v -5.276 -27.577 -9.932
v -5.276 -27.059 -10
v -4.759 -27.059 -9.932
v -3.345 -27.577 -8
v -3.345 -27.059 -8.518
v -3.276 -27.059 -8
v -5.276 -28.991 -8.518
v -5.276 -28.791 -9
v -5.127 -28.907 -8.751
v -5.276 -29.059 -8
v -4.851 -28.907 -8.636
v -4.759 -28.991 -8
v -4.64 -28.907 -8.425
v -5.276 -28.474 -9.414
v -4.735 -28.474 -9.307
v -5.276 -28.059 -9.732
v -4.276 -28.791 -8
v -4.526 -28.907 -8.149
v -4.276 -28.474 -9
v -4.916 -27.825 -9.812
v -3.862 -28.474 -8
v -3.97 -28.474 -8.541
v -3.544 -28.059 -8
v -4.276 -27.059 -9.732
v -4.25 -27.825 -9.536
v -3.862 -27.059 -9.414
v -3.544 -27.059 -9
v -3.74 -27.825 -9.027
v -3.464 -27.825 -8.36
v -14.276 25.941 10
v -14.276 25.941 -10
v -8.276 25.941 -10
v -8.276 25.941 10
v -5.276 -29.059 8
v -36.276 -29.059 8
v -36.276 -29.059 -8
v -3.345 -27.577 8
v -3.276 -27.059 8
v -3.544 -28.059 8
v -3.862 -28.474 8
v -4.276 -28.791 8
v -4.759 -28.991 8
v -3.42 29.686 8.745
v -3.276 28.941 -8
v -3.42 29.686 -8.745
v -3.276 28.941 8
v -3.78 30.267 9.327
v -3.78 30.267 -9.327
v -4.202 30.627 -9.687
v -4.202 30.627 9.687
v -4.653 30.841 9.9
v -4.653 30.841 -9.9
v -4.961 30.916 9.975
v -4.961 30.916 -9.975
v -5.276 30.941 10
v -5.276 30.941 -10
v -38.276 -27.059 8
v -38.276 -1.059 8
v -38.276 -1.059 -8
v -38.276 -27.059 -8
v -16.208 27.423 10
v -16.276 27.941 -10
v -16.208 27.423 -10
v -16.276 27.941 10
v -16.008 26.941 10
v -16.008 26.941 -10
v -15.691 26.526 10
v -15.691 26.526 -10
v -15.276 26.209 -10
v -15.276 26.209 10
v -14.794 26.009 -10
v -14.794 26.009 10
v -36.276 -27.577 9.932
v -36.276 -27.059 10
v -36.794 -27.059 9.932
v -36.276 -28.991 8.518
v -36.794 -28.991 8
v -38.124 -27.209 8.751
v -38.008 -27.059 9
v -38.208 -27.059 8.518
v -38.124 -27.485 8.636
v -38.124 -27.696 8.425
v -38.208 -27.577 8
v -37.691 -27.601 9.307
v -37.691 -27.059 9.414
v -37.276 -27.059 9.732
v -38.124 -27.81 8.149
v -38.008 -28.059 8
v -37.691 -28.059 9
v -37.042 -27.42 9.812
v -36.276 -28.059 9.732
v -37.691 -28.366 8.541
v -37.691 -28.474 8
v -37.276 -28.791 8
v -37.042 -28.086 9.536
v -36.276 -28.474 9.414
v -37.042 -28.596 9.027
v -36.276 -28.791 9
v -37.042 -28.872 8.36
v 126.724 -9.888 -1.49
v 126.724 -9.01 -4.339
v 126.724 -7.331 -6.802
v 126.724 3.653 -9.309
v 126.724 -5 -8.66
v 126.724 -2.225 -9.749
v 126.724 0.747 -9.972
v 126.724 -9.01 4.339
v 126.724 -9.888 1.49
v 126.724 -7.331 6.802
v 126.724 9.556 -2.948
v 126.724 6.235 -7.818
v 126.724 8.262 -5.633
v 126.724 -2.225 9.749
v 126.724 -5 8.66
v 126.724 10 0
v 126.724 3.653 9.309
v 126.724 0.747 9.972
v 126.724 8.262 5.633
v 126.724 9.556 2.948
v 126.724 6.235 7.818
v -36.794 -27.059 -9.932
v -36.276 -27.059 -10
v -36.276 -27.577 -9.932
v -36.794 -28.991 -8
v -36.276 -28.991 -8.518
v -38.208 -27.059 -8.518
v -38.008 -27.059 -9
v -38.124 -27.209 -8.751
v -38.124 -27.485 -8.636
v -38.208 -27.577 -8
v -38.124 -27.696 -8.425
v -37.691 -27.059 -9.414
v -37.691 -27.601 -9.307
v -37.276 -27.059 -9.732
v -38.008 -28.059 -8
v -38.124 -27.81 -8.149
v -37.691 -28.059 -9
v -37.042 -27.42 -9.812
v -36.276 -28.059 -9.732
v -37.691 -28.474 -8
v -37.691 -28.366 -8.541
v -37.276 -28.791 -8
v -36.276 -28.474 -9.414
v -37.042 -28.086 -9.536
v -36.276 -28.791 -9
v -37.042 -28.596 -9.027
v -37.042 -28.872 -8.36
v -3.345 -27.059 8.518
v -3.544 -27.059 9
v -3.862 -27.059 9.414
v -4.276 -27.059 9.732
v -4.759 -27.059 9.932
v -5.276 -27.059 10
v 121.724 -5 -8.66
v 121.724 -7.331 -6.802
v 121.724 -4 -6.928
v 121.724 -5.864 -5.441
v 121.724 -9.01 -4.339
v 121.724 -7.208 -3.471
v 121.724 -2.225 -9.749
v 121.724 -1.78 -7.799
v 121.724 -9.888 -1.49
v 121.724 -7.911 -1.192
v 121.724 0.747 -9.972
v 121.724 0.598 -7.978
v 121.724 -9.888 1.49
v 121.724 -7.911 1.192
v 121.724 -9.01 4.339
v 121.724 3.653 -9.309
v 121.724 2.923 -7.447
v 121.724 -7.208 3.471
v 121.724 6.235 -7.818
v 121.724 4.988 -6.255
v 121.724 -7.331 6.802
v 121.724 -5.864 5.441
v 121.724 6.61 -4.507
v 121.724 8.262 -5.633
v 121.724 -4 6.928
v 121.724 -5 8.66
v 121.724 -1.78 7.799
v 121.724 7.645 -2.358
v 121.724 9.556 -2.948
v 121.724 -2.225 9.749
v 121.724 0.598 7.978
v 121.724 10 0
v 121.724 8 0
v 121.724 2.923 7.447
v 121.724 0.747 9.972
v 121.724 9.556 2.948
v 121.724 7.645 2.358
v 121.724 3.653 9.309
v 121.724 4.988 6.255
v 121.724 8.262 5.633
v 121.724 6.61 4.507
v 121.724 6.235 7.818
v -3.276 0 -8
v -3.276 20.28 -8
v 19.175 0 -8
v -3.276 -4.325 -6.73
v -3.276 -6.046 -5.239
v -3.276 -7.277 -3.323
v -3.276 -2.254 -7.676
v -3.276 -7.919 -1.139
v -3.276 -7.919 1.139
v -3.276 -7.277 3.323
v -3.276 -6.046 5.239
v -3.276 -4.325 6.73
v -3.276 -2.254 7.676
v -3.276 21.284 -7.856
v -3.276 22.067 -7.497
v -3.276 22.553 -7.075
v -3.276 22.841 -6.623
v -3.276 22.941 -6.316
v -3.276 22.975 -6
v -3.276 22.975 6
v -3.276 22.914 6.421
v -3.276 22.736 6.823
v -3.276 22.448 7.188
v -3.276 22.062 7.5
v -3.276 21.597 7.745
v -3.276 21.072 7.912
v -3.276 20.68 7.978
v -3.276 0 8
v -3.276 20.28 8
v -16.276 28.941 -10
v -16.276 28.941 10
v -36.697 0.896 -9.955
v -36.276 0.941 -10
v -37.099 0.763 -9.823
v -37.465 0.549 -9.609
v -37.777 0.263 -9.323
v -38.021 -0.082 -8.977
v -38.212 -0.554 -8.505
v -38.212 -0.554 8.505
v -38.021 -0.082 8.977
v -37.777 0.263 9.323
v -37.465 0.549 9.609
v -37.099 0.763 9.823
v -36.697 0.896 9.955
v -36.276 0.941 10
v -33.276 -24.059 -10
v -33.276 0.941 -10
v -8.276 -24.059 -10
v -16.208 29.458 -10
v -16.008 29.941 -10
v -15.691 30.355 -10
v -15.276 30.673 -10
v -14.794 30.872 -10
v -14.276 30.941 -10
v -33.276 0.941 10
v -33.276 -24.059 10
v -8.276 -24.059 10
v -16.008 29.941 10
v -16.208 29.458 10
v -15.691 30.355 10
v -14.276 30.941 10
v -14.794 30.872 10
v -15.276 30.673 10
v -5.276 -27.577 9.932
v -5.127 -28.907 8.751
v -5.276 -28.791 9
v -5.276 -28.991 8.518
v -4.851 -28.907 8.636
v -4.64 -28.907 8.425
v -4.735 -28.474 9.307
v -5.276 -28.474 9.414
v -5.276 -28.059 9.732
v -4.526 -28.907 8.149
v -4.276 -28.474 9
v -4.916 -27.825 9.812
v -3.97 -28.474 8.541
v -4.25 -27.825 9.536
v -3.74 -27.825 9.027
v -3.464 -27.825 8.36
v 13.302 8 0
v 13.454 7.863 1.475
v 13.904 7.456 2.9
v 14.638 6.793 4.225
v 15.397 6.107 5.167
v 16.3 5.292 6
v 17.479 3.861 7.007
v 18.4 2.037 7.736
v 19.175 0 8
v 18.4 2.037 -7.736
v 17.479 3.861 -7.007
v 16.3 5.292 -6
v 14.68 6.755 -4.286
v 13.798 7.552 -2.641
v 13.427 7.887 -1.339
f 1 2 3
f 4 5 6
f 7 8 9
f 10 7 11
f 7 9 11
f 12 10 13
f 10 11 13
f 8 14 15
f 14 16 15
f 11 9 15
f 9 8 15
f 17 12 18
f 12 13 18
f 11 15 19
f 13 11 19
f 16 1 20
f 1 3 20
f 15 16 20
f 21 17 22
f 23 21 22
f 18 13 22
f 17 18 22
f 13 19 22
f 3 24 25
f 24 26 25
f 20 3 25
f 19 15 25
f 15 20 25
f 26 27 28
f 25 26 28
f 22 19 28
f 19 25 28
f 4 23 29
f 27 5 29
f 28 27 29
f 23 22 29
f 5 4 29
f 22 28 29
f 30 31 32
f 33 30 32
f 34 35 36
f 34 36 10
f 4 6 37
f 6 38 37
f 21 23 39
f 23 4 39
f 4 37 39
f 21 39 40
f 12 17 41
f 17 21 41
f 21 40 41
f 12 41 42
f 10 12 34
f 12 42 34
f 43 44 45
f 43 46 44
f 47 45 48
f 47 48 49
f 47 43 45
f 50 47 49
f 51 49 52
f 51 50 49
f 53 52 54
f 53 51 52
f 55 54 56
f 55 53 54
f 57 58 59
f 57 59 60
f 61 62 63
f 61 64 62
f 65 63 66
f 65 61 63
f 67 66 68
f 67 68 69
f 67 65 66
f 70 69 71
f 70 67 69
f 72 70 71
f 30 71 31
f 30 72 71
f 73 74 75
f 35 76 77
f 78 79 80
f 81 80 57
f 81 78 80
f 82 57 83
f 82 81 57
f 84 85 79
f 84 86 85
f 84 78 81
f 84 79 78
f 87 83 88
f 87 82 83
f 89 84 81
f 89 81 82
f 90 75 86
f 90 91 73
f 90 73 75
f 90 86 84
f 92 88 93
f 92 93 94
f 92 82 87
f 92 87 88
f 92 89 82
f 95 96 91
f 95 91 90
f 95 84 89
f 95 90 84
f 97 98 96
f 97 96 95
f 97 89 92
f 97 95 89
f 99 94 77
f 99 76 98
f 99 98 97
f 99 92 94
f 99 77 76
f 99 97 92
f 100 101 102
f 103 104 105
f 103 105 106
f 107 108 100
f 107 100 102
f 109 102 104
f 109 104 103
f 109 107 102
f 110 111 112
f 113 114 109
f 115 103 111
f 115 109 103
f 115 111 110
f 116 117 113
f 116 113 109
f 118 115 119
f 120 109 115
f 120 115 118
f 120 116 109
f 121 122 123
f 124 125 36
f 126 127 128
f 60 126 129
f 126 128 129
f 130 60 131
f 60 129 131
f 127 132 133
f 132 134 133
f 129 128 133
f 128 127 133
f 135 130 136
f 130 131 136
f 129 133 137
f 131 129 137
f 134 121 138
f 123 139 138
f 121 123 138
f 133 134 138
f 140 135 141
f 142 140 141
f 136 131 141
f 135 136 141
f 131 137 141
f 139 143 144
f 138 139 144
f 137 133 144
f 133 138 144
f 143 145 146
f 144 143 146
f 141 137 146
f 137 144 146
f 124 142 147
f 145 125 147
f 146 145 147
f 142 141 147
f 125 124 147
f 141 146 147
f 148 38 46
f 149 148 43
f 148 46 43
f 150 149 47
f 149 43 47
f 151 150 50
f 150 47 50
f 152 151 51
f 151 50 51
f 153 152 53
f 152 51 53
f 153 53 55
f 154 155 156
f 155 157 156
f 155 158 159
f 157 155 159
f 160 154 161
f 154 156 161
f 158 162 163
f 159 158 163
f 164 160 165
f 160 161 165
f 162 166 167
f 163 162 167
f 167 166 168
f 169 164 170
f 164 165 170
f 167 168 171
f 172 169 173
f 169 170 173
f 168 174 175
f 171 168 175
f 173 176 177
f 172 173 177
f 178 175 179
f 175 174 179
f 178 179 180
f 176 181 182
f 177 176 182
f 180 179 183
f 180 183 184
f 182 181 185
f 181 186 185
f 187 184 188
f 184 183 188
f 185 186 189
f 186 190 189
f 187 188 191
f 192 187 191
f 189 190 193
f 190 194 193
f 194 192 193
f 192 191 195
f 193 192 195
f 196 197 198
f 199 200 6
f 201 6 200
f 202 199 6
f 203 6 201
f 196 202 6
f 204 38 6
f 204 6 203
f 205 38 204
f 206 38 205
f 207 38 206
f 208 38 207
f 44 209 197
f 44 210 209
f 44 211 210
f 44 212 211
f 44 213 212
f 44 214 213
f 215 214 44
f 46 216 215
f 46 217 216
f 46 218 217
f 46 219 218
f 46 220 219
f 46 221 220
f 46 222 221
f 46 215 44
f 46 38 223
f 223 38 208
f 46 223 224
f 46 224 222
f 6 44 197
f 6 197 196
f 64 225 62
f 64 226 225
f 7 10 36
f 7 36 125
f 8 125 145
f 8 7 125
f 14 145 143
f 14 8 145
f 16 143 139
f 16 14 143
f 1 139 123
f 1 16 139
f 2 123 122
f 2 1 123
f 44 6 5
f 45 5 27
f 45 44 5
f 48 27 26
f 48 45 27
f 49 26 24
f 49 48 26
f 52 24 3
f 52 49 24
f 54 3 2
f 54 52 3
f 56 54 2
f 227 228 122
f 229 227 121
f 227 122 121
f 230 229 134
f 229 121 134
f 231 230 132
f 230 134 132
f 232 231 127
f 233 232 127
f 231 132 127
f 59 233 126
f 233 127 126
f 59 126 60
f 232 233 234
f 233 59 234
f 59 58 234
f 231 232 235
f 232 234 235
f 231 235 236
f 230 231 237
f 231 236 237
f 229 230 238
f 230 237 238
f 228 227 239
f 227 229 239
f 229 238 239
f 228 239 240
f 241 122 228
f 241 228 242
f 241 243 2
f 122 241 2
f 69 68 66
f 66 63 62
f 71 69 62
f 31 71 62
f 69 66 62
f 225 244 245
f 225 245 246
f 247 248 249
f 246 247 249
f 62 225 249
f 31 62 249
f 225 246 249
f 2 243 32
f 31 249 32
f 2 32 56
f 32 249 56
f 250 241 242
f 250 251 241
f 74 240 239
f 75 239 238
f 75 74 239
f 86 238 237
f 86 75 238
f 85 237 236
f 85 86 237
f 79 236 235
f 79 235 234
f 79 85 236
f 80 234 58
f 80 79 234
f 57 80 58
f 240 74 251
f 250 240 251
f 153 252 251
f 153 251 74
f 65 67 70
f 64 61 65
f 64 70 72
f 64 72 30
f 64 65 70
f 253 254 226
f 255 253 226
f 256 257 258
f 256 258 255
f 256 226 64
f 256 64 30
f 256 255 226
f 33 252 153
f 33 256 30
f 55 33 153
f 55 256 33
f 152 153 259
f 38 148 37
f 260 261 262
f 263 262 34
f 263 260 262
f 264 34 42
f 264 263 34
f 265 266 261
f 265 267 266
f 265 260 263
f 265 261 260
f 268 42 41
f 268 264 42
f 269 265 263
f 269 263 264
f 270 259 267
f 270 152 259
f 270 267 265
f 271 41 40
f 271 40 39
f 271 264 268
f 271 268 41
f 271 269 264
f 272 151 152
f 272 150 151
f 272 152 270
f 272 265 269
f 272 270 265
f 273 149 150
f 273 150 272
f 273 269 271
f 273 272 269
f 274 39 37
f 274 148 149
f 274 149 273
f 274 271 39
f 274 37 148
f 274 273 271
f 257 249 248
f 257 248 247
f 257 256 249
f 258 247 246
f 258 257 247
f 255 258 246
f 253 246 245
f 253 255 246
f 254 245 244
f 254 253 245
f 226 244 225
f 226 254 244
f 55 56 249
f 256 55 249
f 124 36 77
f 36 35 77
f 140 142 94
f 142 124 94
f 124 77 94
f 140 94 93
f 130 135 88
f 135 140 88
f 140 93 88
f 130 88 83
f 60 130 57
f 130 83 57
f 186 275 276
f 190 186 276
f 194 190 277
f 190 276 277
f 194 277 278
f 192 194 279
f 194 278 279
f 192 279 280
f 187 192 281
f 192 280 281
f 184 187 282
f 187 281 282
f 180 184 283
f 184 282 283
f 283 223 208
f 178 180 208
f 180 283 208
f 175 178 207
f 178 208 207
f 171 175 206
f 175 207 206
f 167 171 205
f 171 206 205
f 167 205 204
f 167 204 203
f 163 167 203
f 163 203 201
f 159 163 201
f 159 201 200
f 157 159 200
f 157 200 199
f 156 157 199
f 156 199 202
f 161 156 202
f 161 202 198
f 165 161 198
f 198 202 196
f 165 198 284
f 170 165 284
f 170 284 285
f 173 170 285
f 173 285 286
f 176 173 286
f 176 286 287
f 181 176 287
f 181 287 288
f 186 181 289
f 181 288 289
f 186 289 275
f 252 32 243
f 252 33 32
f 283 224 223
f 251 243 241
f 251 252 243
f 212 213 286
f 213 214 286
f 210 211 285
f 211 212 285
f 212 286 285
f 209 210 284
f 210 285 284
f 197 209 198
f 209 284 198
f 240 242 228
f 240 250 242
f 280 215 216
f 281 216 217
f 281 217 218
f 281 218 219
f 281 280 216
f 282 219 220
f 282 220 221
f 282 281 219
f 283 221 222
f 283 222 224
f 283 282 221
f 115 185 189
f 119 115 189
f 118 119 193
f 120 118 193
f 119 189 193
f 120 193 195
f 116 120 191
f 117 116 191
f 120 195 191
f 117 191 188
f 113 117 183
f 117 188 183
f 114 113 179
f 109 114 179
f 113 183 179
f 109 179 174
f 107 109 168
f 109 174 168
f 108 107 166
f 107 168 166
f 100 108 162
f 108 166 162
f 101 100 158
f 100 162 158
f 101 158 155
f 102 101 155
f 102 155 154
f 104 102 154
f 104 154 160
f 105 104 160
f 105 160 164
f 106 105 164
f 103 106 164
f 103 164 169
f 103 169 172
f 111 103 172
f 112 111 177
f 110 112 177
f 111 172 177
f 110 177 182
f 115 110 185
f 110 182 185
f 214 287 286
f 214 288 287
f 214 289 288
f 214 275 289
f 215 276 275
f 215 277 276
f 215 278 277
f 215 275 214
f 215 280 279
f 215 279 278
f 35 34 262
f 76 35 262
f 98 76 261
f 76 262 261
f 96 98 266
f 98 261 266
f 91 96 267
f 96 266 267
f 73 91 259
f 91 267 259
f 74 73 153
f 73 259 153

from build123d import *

# Parameters (mm, degrees)
F1_DEPTH     = 10
F2_R         = 8
F3_DEPTH     = 125
F4_R         = 10
F4_R_2       = 8
F5_DEPTH     = 5
F7_DEPTH     = 8
F8_T4_DEPTH  = 47.7749887628
F8_S5_R      = 8
F8_T6_DEPTH  = 26
F8_T11_DEPTH = 47.7749887628
F8_S12_R     = 8
F8_T13_DEPTH = 26
F9_R         = 1.99999


# Not quite as in the source:
# - a fillet or chamfer that OpenCascade refuses, or shapes differently, is made with other operations: its cross-section is extruded or revolved along the edge and cut away or added
# - a fillet or chamfer is up to 0.001 mm smaller than in the source, because OpenCascade refuses the exact size


with BuildPart() as f1:
    # F0 (on Top) → F1 (new body, symmetric)
    with BuildSketch(Plane.XY):
        Polygon((-33.2763881331, -24.0594327205), (-33.2763881331, 0.9405672795), (-38.2763881331, 0.9405672795), (-38.2763881331, -29.0594327205), (-3.2763881331, -29.0594327205), (-3.2763881331, 30.9405672795), (-16.2763881331, 30.9405672795), (-16.2763881331, 25.9405672795), (-8.2763881331, 25.9405672795), (-8.2763881331, -24.0594327205), align=None)
    extrude(amount=F1_DEPTH, both=True)

    # F2 (on face) → F3 (join)
    with BuildSketch(Plane.YZ.offset(-3.2763881331)):
        Circle(F2_R)
    extrude(amount=F3_DEPTH)

    # F4 (on face) → F5 (join)
    with BuildSketch(Plane.YZ.offset(121.7236118669)):
        Circle(F4_R)
        Circle(F4_R_2, mode=Mode.SUBTRACT)
        Circle(F4_R_2)
    extrude(amount=F5_DEPTH)

    # F6 (on Top) → F7 (join, symmetric)
    with BuildSketch(Plane.XY):
        Polygon((22.1584475915, 0), (-4.7209444456, 24.2796987295), (-7.46962009, 0), align=None)
    extrude(amount=F7_DEPTH, both=True)

    # F8: fillet of radius 2 on 2 edges, made by hand


with BuildPart() as f8_tool2:
    # F8_s3 → F8_t4 (new body)
    with BuildSketch(Plane(origin=(18.5100171986, -16.719784452, 0), x_dir=(0, 0, 1), z_dir=(-0.742081519, 0.6703096442, 0))):
        with BuildLine():
            ThreePointArc((6, 14.8530211221), (7.4142135624, 14.2672346845), (8, 12.8530211221))
            Line((8, 12.8530211221), (8, 14.8530211221))
            Line((8, 14.8530211221), (6, 14.8530211221))
        make_face()
    extrude(amount=F8_T4_DEPTH)

    # F8_s5 → F8_t6 (cut, symmetric)
    with BuildSketch(Plane.YZ.offset(10.1)):
        Circle(F8_S5_R)
    extrude(amount=F8_T6_DEPTH, both=True, mode=Mode.SUBTRACT)

    split(bisect_by=Plane.YZ.offset(-3.2763881331), keep=Keep.TOP)


with BuildPart() as f1_1:
    add(f1.part)

    # F8_t1: cut F8_tool2
    add(f8_tool2.part, mode=Mode.SUBTRACT)


with BuildPart() as f8_tool9:
    # F8_s10 → F8_t11 (new body)
    with BuildSketch(Plane(origin=(18.5100171986, -16.719784452, 0), x_dir=(0, 0, 1), z_dir=(-0.742081519, 0.6703096442, 0))):
        with BuildLine():
            ThreePointArc((-6, 14.8530211221), (-7.4142135624, 14.2672346845), (-8, 12.8530211221))
            Line((-8, 12.8530211221), (-8, 14.8530211221))
            Line((-8, 14.8530211221), (-6, 14.8530211221))
        make_face()
    extrude(amount=F8_T11_DEPTH)

    # F8_s12 → F8_t13 (cut, symmetric)
    with BuildSketch(Plane.YZ.offset(10.1)):
        Circle(F8_S12_R)
    extrude(amount=F8_T13_DEPTH, both=True, mode=Mode.SUBTRACT)

    split(bisect_by=Plane.YZ.offset(-3.2763881331), keep=Keep.TOP)


with BuildPart() as f1_2:
    add(f1_1.part)

    # F8_t8: cut F8_tool9
    add(f8_tool9.part, mode=Mode.SUBTRACT)

    # F9 (radius 2 in the source; OpenCascade refuses exactly that, so slightly less here)
    f9_edges = [f1_2.edges().sort_by_distance(p)[0] for p in [
        (-3.276388, 0.940567, 10),
        (-3.276388, 0.940567, -10),
        (-20.776388, -29.059433, 10),
        (-20.776388, -29.059433, -10),
        (-38.276388, -14.059433, 10),
        (-38.276388, -14.059433, -10),
        (-38.276388, -29.059433, 0),
        (-38.276388, 0.940567, 0),
        (-3.276388, -29.059433, 0),
        (-3.276388, 30.940567, 0),
        (-16.276388, 30.940567, 0),
        (-16.276388, 25.940567, 0),
    ]]
    fillet(f9_edges, radius=F9_R)


solid = f1_2.part
